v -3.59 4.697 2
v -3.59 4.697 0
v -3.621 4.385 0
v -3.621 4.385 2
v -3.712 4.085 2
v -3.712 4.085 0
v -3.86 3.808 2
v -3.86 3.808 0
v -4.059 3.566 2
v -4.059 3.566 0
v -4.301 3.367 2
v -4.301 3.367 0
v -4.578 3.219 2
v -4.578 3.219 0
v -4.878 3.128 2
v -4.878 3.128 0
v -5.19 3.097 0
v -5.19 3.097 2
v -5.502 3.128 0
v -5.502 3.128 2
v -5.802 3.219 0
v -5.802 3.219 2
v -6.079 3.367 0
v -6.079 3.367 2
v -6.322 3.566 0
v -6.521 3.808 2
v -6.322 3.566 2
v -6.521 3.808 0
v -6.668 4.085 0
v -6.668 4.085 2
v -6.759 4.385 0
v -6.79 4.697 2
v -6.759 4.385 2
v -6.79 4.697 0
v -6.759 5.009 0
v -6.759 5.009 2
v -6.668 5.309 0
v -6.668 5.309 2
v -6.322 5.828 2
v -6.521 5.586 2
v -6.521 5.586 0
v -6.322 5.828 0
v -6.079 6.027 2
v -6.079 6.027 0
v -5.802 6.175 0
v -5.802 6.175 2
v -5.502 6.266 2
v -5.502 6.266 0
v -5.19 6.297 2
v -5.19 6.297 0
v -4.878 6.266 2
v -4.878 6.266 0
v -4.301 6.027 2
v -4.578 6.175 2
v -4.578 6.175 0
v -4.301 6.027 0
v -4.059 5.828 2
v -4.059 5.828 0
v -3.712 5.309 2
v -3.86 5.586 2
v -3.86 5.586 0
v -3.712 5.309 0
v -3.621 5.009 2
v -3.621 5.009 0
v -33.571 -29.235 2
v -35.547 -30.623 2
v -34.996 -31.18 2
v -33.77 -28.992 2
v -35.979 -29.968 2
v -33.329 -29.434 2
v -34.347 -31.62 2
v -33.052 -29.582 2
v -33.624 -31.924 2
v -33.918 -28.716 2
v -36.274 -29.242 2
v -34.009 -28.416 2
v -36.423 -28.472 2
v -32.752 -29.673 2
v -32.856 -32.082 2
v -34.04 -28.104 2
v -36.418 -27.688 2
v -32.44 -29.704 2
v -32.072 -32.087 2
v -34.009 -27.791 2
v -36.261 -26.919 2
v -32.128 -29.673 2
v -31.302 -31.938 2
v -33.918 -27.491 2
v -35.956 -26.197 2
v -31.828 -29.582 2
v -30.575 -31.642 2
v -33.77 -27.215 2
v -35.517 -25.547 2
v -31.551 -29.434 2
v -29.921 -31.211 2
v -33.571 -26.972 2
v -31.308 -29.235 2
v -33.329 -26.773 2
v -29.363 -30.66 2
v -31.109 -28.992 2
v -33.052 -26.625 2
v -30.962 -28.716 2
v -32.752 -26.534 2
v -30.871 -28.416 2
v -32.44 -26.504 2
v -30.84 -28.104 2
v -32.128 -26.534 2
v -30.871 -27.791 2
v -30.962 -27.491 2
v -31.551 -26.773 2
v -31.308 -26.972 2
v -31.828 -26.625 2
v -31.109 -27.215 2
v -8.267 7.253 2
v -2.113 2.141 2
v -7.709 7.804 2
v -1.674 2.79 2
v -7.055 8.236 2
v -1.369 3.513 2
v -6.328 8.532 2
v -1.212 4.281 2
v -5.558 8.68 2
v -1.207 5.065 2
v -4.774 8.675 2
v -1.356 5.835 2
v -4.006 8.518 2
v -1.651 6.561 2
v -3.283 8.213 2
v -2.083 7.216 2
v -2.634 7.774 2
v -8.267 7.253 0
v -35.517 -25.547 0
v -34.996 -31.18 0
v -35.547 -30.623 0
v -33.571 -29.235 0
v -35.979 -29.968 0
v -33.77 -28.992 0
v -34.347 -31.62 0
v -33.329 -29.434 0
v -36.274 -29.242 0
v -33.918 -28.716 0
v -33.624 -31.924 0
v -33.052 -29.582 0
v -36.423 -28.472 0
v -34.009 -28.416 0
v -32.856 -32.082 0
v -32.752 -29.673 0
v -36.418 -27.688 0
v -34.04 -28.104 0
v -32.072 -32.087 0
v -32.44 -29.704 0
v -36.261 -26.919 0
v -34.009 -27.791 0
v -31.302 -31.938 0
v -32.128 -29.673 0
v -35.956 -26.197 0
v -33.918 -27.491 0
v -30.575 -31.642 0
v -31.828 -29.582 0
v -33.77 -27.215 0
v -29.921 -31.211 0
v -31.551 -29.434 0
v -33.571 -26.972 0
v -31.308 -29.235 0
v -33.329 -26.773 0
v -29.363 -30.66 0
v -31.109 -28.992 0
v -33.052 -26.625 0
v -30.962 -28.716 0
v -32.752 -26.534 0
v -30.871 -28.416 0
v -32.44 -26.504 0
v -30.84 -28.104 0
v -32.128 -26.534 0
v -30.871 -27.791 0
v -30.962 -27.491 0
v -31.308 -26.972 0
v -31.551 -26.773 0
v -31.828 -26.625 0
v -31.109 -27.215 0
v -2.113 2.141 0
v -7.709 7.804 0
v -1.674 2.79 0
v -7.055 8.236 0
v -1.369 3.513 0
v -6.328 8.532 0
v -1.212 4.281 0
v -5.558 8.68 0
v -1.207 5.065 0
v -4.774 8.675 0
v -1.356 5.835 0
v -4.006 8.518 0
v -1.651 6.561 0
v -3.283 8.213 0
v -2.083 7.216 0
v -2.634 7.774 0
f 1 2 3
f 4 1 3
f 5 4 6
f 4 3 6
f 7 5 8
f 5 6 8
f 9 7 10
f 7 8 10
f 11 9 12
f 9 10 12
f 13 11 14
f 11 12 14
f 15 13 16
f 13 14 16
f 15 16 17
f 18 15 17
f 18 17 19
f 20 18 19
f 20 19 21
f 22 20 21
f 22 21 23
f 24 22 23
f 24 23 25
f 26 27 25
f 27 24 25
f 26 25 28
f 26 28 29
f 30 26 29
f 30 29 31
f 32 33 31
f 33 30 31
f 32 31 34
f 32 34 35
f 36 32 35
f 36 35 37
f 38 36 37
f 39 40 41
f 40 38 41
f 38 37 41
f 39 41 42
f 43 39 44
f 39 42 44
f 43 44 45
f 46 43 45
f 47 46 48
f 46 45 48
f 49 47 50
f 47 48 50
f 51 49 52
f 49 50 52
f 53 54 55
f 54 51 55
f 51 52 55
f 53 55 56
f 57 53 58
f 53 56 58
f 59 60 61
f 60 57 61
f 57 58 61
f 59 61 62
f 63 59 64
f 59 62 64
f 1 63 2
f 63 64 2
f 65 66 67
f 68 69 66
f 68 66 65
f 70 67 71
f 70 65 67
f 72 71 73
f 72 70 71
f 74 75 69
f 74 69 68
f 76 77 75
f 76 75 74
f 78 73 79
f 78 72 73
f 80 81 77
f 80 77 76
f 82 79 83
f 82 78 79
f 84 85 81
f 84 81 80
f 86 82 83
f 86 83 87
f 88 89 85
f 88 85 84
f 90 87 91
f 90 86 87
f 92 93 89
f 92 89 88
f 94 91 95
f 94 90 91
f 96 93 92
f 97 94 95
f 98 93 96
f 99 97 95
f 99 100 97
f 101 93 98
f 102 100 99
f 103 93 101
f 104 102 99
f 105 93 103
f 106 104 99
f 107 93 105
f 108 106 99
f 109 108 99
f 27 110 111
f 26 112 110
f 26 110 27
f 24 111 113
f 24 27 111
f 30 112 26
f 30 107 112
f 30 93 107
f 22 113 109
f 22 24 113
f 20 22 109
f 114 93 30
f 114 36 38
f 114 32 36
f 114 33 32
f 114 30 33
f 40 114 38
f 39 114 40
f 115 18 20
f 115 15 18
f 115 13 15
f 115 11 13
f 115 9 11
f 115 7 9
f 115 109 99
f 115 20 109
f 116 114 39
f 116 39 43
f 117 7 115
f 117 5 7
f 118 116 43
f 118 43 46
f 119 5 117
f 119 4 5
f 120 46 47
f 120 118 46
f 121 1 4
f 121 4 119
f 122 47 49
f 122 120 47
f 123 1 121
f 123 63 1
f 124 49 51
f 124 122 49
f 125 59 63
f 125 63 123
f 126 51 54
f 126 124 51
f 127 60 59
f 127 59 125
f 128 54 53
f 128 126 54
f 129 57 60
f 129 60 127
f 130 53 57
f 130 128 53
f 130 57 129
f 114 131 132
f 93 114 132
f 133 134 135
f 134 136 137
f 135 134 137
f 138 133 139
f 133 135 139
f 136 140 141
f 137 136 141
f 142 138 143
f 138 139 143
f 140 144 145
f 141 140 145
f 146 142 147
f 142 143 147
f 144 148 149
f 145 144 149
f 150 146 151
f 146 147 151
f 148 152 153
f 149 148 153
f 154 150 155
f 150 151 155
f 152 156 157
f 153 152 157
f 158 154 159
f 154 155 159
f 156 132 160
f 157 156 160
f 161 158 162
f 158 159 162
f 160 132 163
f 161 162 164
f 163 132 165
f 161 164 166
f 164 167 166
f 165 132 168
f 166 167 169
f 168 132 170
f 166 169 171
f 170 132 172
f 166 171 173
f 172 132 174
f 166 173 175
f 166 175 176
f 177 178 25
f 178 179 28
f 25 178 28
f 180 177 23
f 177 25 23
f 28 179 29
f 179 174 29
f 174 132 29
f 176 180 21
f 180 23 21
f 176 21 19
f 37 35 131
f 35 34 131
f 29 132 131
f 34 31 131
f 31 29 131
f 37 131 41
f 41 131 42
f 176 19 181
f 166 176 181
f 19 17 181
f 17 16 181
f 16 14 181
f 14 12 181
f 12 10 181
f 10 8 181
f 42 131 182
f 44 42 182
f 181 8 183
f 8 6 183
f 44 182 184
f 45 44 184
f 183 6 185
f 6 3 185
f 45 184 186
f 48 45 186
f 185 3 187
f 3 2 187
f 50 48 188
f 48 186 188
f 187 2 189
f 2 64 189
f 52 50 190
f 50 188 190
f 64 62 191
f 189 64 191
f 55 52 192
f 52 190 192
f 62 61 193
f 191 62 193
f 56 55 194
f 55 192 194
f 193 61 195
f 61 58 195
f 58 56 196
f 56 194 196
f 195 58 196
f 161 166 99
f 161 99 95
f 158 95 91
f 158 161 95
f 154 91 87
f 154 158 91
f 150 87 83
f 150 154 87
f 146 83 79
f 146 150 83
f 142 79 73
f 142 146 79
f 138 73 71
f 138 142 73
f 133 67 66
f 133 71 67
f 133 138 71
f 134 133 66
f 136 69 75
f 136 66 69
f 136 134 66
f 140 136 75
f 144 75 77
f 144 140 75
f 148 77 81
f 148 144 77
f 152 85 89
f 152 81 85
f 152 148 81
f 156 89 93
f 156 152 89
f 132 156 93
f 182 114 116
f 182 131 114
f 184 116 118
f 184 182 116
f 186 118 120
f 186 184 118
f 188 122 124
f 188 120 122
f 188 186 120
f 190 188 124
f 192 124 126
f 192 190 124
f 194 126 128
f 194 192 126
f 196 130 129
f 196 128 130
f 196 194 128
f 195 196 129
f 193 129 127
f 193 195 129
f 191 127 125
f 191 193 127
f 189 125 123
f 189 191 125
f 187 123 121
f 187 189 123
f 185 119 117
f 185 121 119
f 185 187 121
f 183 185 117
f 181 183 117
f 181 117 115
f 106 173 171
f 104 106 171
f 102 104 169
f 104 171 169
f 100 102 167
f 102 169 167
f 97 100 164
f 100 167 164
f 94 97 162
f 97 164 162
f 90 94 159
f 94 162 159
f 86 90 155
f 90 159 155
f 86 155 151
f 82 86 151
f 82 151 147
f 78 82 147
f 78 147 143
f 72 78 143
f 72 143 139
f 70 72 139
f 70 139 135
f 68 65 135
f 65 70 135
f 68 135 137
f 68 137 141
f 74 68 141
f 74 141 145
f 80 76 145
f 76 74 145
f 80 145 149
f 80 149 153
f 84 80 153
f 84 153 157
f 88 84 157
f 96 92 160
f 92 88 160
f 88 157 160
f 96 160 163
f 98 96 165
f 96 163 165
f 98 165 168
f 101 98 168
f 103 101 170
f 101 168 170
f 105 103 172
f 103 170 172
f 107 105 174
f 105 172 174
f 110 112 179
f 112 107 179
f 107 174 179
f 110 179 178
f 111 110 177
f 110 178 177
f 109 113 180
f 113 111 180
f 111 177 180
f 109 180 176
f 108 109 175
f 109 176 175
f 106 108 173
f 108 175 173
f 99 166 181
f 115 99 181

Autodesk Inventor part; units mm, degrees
ref_plane "YZ Plane" through (0, 0, 0) normal (1, 0, 0) x (0, 1, 0)
ref_plane "XZ Plane" through (0, 0, 0) normal (0, 1, 0) x (-1, 0, 0)
ref_plane "XY Plane" through (0, 0, 0) normal (0, 0, 1) x (1, 0, 0)
sketch "Sketch1" plane through (0, 0, 0) normal (0, 0, 1) x (1, 0, 0)
  circle A0 centre (-5.1902, 4.697) radius 1.6 projected
  circle A1 centre (-32.4398, -28.1035) radius 1.6 projected
  line L0 (-32.4398, -28.1035) -> (-5.1902, 4.697) construction
  line L1 (-29.363, -30.6596) -> (-2.1134, 2.1409)
  line L2 (-8.267, 7.2531) -> (-35.5166, -25.5474)
  arc A2 (-35.5166, -25.5474) -> (-29.363, -30.6596) centre (-32.4398, -28.1035) ccw
  arc A3 (-2.1134, 2.1409) -> (-8.267, 7.2531) centre (-5.1902, 4.697) ccw
  point P0 (0, 0)
  point P1 (-18.815, -11.7033)
  dimension "d0" = 4
extrude "Extrusion1" add sketch "Sketch1" along normal blind 2
properties part number "linkage-arm"
